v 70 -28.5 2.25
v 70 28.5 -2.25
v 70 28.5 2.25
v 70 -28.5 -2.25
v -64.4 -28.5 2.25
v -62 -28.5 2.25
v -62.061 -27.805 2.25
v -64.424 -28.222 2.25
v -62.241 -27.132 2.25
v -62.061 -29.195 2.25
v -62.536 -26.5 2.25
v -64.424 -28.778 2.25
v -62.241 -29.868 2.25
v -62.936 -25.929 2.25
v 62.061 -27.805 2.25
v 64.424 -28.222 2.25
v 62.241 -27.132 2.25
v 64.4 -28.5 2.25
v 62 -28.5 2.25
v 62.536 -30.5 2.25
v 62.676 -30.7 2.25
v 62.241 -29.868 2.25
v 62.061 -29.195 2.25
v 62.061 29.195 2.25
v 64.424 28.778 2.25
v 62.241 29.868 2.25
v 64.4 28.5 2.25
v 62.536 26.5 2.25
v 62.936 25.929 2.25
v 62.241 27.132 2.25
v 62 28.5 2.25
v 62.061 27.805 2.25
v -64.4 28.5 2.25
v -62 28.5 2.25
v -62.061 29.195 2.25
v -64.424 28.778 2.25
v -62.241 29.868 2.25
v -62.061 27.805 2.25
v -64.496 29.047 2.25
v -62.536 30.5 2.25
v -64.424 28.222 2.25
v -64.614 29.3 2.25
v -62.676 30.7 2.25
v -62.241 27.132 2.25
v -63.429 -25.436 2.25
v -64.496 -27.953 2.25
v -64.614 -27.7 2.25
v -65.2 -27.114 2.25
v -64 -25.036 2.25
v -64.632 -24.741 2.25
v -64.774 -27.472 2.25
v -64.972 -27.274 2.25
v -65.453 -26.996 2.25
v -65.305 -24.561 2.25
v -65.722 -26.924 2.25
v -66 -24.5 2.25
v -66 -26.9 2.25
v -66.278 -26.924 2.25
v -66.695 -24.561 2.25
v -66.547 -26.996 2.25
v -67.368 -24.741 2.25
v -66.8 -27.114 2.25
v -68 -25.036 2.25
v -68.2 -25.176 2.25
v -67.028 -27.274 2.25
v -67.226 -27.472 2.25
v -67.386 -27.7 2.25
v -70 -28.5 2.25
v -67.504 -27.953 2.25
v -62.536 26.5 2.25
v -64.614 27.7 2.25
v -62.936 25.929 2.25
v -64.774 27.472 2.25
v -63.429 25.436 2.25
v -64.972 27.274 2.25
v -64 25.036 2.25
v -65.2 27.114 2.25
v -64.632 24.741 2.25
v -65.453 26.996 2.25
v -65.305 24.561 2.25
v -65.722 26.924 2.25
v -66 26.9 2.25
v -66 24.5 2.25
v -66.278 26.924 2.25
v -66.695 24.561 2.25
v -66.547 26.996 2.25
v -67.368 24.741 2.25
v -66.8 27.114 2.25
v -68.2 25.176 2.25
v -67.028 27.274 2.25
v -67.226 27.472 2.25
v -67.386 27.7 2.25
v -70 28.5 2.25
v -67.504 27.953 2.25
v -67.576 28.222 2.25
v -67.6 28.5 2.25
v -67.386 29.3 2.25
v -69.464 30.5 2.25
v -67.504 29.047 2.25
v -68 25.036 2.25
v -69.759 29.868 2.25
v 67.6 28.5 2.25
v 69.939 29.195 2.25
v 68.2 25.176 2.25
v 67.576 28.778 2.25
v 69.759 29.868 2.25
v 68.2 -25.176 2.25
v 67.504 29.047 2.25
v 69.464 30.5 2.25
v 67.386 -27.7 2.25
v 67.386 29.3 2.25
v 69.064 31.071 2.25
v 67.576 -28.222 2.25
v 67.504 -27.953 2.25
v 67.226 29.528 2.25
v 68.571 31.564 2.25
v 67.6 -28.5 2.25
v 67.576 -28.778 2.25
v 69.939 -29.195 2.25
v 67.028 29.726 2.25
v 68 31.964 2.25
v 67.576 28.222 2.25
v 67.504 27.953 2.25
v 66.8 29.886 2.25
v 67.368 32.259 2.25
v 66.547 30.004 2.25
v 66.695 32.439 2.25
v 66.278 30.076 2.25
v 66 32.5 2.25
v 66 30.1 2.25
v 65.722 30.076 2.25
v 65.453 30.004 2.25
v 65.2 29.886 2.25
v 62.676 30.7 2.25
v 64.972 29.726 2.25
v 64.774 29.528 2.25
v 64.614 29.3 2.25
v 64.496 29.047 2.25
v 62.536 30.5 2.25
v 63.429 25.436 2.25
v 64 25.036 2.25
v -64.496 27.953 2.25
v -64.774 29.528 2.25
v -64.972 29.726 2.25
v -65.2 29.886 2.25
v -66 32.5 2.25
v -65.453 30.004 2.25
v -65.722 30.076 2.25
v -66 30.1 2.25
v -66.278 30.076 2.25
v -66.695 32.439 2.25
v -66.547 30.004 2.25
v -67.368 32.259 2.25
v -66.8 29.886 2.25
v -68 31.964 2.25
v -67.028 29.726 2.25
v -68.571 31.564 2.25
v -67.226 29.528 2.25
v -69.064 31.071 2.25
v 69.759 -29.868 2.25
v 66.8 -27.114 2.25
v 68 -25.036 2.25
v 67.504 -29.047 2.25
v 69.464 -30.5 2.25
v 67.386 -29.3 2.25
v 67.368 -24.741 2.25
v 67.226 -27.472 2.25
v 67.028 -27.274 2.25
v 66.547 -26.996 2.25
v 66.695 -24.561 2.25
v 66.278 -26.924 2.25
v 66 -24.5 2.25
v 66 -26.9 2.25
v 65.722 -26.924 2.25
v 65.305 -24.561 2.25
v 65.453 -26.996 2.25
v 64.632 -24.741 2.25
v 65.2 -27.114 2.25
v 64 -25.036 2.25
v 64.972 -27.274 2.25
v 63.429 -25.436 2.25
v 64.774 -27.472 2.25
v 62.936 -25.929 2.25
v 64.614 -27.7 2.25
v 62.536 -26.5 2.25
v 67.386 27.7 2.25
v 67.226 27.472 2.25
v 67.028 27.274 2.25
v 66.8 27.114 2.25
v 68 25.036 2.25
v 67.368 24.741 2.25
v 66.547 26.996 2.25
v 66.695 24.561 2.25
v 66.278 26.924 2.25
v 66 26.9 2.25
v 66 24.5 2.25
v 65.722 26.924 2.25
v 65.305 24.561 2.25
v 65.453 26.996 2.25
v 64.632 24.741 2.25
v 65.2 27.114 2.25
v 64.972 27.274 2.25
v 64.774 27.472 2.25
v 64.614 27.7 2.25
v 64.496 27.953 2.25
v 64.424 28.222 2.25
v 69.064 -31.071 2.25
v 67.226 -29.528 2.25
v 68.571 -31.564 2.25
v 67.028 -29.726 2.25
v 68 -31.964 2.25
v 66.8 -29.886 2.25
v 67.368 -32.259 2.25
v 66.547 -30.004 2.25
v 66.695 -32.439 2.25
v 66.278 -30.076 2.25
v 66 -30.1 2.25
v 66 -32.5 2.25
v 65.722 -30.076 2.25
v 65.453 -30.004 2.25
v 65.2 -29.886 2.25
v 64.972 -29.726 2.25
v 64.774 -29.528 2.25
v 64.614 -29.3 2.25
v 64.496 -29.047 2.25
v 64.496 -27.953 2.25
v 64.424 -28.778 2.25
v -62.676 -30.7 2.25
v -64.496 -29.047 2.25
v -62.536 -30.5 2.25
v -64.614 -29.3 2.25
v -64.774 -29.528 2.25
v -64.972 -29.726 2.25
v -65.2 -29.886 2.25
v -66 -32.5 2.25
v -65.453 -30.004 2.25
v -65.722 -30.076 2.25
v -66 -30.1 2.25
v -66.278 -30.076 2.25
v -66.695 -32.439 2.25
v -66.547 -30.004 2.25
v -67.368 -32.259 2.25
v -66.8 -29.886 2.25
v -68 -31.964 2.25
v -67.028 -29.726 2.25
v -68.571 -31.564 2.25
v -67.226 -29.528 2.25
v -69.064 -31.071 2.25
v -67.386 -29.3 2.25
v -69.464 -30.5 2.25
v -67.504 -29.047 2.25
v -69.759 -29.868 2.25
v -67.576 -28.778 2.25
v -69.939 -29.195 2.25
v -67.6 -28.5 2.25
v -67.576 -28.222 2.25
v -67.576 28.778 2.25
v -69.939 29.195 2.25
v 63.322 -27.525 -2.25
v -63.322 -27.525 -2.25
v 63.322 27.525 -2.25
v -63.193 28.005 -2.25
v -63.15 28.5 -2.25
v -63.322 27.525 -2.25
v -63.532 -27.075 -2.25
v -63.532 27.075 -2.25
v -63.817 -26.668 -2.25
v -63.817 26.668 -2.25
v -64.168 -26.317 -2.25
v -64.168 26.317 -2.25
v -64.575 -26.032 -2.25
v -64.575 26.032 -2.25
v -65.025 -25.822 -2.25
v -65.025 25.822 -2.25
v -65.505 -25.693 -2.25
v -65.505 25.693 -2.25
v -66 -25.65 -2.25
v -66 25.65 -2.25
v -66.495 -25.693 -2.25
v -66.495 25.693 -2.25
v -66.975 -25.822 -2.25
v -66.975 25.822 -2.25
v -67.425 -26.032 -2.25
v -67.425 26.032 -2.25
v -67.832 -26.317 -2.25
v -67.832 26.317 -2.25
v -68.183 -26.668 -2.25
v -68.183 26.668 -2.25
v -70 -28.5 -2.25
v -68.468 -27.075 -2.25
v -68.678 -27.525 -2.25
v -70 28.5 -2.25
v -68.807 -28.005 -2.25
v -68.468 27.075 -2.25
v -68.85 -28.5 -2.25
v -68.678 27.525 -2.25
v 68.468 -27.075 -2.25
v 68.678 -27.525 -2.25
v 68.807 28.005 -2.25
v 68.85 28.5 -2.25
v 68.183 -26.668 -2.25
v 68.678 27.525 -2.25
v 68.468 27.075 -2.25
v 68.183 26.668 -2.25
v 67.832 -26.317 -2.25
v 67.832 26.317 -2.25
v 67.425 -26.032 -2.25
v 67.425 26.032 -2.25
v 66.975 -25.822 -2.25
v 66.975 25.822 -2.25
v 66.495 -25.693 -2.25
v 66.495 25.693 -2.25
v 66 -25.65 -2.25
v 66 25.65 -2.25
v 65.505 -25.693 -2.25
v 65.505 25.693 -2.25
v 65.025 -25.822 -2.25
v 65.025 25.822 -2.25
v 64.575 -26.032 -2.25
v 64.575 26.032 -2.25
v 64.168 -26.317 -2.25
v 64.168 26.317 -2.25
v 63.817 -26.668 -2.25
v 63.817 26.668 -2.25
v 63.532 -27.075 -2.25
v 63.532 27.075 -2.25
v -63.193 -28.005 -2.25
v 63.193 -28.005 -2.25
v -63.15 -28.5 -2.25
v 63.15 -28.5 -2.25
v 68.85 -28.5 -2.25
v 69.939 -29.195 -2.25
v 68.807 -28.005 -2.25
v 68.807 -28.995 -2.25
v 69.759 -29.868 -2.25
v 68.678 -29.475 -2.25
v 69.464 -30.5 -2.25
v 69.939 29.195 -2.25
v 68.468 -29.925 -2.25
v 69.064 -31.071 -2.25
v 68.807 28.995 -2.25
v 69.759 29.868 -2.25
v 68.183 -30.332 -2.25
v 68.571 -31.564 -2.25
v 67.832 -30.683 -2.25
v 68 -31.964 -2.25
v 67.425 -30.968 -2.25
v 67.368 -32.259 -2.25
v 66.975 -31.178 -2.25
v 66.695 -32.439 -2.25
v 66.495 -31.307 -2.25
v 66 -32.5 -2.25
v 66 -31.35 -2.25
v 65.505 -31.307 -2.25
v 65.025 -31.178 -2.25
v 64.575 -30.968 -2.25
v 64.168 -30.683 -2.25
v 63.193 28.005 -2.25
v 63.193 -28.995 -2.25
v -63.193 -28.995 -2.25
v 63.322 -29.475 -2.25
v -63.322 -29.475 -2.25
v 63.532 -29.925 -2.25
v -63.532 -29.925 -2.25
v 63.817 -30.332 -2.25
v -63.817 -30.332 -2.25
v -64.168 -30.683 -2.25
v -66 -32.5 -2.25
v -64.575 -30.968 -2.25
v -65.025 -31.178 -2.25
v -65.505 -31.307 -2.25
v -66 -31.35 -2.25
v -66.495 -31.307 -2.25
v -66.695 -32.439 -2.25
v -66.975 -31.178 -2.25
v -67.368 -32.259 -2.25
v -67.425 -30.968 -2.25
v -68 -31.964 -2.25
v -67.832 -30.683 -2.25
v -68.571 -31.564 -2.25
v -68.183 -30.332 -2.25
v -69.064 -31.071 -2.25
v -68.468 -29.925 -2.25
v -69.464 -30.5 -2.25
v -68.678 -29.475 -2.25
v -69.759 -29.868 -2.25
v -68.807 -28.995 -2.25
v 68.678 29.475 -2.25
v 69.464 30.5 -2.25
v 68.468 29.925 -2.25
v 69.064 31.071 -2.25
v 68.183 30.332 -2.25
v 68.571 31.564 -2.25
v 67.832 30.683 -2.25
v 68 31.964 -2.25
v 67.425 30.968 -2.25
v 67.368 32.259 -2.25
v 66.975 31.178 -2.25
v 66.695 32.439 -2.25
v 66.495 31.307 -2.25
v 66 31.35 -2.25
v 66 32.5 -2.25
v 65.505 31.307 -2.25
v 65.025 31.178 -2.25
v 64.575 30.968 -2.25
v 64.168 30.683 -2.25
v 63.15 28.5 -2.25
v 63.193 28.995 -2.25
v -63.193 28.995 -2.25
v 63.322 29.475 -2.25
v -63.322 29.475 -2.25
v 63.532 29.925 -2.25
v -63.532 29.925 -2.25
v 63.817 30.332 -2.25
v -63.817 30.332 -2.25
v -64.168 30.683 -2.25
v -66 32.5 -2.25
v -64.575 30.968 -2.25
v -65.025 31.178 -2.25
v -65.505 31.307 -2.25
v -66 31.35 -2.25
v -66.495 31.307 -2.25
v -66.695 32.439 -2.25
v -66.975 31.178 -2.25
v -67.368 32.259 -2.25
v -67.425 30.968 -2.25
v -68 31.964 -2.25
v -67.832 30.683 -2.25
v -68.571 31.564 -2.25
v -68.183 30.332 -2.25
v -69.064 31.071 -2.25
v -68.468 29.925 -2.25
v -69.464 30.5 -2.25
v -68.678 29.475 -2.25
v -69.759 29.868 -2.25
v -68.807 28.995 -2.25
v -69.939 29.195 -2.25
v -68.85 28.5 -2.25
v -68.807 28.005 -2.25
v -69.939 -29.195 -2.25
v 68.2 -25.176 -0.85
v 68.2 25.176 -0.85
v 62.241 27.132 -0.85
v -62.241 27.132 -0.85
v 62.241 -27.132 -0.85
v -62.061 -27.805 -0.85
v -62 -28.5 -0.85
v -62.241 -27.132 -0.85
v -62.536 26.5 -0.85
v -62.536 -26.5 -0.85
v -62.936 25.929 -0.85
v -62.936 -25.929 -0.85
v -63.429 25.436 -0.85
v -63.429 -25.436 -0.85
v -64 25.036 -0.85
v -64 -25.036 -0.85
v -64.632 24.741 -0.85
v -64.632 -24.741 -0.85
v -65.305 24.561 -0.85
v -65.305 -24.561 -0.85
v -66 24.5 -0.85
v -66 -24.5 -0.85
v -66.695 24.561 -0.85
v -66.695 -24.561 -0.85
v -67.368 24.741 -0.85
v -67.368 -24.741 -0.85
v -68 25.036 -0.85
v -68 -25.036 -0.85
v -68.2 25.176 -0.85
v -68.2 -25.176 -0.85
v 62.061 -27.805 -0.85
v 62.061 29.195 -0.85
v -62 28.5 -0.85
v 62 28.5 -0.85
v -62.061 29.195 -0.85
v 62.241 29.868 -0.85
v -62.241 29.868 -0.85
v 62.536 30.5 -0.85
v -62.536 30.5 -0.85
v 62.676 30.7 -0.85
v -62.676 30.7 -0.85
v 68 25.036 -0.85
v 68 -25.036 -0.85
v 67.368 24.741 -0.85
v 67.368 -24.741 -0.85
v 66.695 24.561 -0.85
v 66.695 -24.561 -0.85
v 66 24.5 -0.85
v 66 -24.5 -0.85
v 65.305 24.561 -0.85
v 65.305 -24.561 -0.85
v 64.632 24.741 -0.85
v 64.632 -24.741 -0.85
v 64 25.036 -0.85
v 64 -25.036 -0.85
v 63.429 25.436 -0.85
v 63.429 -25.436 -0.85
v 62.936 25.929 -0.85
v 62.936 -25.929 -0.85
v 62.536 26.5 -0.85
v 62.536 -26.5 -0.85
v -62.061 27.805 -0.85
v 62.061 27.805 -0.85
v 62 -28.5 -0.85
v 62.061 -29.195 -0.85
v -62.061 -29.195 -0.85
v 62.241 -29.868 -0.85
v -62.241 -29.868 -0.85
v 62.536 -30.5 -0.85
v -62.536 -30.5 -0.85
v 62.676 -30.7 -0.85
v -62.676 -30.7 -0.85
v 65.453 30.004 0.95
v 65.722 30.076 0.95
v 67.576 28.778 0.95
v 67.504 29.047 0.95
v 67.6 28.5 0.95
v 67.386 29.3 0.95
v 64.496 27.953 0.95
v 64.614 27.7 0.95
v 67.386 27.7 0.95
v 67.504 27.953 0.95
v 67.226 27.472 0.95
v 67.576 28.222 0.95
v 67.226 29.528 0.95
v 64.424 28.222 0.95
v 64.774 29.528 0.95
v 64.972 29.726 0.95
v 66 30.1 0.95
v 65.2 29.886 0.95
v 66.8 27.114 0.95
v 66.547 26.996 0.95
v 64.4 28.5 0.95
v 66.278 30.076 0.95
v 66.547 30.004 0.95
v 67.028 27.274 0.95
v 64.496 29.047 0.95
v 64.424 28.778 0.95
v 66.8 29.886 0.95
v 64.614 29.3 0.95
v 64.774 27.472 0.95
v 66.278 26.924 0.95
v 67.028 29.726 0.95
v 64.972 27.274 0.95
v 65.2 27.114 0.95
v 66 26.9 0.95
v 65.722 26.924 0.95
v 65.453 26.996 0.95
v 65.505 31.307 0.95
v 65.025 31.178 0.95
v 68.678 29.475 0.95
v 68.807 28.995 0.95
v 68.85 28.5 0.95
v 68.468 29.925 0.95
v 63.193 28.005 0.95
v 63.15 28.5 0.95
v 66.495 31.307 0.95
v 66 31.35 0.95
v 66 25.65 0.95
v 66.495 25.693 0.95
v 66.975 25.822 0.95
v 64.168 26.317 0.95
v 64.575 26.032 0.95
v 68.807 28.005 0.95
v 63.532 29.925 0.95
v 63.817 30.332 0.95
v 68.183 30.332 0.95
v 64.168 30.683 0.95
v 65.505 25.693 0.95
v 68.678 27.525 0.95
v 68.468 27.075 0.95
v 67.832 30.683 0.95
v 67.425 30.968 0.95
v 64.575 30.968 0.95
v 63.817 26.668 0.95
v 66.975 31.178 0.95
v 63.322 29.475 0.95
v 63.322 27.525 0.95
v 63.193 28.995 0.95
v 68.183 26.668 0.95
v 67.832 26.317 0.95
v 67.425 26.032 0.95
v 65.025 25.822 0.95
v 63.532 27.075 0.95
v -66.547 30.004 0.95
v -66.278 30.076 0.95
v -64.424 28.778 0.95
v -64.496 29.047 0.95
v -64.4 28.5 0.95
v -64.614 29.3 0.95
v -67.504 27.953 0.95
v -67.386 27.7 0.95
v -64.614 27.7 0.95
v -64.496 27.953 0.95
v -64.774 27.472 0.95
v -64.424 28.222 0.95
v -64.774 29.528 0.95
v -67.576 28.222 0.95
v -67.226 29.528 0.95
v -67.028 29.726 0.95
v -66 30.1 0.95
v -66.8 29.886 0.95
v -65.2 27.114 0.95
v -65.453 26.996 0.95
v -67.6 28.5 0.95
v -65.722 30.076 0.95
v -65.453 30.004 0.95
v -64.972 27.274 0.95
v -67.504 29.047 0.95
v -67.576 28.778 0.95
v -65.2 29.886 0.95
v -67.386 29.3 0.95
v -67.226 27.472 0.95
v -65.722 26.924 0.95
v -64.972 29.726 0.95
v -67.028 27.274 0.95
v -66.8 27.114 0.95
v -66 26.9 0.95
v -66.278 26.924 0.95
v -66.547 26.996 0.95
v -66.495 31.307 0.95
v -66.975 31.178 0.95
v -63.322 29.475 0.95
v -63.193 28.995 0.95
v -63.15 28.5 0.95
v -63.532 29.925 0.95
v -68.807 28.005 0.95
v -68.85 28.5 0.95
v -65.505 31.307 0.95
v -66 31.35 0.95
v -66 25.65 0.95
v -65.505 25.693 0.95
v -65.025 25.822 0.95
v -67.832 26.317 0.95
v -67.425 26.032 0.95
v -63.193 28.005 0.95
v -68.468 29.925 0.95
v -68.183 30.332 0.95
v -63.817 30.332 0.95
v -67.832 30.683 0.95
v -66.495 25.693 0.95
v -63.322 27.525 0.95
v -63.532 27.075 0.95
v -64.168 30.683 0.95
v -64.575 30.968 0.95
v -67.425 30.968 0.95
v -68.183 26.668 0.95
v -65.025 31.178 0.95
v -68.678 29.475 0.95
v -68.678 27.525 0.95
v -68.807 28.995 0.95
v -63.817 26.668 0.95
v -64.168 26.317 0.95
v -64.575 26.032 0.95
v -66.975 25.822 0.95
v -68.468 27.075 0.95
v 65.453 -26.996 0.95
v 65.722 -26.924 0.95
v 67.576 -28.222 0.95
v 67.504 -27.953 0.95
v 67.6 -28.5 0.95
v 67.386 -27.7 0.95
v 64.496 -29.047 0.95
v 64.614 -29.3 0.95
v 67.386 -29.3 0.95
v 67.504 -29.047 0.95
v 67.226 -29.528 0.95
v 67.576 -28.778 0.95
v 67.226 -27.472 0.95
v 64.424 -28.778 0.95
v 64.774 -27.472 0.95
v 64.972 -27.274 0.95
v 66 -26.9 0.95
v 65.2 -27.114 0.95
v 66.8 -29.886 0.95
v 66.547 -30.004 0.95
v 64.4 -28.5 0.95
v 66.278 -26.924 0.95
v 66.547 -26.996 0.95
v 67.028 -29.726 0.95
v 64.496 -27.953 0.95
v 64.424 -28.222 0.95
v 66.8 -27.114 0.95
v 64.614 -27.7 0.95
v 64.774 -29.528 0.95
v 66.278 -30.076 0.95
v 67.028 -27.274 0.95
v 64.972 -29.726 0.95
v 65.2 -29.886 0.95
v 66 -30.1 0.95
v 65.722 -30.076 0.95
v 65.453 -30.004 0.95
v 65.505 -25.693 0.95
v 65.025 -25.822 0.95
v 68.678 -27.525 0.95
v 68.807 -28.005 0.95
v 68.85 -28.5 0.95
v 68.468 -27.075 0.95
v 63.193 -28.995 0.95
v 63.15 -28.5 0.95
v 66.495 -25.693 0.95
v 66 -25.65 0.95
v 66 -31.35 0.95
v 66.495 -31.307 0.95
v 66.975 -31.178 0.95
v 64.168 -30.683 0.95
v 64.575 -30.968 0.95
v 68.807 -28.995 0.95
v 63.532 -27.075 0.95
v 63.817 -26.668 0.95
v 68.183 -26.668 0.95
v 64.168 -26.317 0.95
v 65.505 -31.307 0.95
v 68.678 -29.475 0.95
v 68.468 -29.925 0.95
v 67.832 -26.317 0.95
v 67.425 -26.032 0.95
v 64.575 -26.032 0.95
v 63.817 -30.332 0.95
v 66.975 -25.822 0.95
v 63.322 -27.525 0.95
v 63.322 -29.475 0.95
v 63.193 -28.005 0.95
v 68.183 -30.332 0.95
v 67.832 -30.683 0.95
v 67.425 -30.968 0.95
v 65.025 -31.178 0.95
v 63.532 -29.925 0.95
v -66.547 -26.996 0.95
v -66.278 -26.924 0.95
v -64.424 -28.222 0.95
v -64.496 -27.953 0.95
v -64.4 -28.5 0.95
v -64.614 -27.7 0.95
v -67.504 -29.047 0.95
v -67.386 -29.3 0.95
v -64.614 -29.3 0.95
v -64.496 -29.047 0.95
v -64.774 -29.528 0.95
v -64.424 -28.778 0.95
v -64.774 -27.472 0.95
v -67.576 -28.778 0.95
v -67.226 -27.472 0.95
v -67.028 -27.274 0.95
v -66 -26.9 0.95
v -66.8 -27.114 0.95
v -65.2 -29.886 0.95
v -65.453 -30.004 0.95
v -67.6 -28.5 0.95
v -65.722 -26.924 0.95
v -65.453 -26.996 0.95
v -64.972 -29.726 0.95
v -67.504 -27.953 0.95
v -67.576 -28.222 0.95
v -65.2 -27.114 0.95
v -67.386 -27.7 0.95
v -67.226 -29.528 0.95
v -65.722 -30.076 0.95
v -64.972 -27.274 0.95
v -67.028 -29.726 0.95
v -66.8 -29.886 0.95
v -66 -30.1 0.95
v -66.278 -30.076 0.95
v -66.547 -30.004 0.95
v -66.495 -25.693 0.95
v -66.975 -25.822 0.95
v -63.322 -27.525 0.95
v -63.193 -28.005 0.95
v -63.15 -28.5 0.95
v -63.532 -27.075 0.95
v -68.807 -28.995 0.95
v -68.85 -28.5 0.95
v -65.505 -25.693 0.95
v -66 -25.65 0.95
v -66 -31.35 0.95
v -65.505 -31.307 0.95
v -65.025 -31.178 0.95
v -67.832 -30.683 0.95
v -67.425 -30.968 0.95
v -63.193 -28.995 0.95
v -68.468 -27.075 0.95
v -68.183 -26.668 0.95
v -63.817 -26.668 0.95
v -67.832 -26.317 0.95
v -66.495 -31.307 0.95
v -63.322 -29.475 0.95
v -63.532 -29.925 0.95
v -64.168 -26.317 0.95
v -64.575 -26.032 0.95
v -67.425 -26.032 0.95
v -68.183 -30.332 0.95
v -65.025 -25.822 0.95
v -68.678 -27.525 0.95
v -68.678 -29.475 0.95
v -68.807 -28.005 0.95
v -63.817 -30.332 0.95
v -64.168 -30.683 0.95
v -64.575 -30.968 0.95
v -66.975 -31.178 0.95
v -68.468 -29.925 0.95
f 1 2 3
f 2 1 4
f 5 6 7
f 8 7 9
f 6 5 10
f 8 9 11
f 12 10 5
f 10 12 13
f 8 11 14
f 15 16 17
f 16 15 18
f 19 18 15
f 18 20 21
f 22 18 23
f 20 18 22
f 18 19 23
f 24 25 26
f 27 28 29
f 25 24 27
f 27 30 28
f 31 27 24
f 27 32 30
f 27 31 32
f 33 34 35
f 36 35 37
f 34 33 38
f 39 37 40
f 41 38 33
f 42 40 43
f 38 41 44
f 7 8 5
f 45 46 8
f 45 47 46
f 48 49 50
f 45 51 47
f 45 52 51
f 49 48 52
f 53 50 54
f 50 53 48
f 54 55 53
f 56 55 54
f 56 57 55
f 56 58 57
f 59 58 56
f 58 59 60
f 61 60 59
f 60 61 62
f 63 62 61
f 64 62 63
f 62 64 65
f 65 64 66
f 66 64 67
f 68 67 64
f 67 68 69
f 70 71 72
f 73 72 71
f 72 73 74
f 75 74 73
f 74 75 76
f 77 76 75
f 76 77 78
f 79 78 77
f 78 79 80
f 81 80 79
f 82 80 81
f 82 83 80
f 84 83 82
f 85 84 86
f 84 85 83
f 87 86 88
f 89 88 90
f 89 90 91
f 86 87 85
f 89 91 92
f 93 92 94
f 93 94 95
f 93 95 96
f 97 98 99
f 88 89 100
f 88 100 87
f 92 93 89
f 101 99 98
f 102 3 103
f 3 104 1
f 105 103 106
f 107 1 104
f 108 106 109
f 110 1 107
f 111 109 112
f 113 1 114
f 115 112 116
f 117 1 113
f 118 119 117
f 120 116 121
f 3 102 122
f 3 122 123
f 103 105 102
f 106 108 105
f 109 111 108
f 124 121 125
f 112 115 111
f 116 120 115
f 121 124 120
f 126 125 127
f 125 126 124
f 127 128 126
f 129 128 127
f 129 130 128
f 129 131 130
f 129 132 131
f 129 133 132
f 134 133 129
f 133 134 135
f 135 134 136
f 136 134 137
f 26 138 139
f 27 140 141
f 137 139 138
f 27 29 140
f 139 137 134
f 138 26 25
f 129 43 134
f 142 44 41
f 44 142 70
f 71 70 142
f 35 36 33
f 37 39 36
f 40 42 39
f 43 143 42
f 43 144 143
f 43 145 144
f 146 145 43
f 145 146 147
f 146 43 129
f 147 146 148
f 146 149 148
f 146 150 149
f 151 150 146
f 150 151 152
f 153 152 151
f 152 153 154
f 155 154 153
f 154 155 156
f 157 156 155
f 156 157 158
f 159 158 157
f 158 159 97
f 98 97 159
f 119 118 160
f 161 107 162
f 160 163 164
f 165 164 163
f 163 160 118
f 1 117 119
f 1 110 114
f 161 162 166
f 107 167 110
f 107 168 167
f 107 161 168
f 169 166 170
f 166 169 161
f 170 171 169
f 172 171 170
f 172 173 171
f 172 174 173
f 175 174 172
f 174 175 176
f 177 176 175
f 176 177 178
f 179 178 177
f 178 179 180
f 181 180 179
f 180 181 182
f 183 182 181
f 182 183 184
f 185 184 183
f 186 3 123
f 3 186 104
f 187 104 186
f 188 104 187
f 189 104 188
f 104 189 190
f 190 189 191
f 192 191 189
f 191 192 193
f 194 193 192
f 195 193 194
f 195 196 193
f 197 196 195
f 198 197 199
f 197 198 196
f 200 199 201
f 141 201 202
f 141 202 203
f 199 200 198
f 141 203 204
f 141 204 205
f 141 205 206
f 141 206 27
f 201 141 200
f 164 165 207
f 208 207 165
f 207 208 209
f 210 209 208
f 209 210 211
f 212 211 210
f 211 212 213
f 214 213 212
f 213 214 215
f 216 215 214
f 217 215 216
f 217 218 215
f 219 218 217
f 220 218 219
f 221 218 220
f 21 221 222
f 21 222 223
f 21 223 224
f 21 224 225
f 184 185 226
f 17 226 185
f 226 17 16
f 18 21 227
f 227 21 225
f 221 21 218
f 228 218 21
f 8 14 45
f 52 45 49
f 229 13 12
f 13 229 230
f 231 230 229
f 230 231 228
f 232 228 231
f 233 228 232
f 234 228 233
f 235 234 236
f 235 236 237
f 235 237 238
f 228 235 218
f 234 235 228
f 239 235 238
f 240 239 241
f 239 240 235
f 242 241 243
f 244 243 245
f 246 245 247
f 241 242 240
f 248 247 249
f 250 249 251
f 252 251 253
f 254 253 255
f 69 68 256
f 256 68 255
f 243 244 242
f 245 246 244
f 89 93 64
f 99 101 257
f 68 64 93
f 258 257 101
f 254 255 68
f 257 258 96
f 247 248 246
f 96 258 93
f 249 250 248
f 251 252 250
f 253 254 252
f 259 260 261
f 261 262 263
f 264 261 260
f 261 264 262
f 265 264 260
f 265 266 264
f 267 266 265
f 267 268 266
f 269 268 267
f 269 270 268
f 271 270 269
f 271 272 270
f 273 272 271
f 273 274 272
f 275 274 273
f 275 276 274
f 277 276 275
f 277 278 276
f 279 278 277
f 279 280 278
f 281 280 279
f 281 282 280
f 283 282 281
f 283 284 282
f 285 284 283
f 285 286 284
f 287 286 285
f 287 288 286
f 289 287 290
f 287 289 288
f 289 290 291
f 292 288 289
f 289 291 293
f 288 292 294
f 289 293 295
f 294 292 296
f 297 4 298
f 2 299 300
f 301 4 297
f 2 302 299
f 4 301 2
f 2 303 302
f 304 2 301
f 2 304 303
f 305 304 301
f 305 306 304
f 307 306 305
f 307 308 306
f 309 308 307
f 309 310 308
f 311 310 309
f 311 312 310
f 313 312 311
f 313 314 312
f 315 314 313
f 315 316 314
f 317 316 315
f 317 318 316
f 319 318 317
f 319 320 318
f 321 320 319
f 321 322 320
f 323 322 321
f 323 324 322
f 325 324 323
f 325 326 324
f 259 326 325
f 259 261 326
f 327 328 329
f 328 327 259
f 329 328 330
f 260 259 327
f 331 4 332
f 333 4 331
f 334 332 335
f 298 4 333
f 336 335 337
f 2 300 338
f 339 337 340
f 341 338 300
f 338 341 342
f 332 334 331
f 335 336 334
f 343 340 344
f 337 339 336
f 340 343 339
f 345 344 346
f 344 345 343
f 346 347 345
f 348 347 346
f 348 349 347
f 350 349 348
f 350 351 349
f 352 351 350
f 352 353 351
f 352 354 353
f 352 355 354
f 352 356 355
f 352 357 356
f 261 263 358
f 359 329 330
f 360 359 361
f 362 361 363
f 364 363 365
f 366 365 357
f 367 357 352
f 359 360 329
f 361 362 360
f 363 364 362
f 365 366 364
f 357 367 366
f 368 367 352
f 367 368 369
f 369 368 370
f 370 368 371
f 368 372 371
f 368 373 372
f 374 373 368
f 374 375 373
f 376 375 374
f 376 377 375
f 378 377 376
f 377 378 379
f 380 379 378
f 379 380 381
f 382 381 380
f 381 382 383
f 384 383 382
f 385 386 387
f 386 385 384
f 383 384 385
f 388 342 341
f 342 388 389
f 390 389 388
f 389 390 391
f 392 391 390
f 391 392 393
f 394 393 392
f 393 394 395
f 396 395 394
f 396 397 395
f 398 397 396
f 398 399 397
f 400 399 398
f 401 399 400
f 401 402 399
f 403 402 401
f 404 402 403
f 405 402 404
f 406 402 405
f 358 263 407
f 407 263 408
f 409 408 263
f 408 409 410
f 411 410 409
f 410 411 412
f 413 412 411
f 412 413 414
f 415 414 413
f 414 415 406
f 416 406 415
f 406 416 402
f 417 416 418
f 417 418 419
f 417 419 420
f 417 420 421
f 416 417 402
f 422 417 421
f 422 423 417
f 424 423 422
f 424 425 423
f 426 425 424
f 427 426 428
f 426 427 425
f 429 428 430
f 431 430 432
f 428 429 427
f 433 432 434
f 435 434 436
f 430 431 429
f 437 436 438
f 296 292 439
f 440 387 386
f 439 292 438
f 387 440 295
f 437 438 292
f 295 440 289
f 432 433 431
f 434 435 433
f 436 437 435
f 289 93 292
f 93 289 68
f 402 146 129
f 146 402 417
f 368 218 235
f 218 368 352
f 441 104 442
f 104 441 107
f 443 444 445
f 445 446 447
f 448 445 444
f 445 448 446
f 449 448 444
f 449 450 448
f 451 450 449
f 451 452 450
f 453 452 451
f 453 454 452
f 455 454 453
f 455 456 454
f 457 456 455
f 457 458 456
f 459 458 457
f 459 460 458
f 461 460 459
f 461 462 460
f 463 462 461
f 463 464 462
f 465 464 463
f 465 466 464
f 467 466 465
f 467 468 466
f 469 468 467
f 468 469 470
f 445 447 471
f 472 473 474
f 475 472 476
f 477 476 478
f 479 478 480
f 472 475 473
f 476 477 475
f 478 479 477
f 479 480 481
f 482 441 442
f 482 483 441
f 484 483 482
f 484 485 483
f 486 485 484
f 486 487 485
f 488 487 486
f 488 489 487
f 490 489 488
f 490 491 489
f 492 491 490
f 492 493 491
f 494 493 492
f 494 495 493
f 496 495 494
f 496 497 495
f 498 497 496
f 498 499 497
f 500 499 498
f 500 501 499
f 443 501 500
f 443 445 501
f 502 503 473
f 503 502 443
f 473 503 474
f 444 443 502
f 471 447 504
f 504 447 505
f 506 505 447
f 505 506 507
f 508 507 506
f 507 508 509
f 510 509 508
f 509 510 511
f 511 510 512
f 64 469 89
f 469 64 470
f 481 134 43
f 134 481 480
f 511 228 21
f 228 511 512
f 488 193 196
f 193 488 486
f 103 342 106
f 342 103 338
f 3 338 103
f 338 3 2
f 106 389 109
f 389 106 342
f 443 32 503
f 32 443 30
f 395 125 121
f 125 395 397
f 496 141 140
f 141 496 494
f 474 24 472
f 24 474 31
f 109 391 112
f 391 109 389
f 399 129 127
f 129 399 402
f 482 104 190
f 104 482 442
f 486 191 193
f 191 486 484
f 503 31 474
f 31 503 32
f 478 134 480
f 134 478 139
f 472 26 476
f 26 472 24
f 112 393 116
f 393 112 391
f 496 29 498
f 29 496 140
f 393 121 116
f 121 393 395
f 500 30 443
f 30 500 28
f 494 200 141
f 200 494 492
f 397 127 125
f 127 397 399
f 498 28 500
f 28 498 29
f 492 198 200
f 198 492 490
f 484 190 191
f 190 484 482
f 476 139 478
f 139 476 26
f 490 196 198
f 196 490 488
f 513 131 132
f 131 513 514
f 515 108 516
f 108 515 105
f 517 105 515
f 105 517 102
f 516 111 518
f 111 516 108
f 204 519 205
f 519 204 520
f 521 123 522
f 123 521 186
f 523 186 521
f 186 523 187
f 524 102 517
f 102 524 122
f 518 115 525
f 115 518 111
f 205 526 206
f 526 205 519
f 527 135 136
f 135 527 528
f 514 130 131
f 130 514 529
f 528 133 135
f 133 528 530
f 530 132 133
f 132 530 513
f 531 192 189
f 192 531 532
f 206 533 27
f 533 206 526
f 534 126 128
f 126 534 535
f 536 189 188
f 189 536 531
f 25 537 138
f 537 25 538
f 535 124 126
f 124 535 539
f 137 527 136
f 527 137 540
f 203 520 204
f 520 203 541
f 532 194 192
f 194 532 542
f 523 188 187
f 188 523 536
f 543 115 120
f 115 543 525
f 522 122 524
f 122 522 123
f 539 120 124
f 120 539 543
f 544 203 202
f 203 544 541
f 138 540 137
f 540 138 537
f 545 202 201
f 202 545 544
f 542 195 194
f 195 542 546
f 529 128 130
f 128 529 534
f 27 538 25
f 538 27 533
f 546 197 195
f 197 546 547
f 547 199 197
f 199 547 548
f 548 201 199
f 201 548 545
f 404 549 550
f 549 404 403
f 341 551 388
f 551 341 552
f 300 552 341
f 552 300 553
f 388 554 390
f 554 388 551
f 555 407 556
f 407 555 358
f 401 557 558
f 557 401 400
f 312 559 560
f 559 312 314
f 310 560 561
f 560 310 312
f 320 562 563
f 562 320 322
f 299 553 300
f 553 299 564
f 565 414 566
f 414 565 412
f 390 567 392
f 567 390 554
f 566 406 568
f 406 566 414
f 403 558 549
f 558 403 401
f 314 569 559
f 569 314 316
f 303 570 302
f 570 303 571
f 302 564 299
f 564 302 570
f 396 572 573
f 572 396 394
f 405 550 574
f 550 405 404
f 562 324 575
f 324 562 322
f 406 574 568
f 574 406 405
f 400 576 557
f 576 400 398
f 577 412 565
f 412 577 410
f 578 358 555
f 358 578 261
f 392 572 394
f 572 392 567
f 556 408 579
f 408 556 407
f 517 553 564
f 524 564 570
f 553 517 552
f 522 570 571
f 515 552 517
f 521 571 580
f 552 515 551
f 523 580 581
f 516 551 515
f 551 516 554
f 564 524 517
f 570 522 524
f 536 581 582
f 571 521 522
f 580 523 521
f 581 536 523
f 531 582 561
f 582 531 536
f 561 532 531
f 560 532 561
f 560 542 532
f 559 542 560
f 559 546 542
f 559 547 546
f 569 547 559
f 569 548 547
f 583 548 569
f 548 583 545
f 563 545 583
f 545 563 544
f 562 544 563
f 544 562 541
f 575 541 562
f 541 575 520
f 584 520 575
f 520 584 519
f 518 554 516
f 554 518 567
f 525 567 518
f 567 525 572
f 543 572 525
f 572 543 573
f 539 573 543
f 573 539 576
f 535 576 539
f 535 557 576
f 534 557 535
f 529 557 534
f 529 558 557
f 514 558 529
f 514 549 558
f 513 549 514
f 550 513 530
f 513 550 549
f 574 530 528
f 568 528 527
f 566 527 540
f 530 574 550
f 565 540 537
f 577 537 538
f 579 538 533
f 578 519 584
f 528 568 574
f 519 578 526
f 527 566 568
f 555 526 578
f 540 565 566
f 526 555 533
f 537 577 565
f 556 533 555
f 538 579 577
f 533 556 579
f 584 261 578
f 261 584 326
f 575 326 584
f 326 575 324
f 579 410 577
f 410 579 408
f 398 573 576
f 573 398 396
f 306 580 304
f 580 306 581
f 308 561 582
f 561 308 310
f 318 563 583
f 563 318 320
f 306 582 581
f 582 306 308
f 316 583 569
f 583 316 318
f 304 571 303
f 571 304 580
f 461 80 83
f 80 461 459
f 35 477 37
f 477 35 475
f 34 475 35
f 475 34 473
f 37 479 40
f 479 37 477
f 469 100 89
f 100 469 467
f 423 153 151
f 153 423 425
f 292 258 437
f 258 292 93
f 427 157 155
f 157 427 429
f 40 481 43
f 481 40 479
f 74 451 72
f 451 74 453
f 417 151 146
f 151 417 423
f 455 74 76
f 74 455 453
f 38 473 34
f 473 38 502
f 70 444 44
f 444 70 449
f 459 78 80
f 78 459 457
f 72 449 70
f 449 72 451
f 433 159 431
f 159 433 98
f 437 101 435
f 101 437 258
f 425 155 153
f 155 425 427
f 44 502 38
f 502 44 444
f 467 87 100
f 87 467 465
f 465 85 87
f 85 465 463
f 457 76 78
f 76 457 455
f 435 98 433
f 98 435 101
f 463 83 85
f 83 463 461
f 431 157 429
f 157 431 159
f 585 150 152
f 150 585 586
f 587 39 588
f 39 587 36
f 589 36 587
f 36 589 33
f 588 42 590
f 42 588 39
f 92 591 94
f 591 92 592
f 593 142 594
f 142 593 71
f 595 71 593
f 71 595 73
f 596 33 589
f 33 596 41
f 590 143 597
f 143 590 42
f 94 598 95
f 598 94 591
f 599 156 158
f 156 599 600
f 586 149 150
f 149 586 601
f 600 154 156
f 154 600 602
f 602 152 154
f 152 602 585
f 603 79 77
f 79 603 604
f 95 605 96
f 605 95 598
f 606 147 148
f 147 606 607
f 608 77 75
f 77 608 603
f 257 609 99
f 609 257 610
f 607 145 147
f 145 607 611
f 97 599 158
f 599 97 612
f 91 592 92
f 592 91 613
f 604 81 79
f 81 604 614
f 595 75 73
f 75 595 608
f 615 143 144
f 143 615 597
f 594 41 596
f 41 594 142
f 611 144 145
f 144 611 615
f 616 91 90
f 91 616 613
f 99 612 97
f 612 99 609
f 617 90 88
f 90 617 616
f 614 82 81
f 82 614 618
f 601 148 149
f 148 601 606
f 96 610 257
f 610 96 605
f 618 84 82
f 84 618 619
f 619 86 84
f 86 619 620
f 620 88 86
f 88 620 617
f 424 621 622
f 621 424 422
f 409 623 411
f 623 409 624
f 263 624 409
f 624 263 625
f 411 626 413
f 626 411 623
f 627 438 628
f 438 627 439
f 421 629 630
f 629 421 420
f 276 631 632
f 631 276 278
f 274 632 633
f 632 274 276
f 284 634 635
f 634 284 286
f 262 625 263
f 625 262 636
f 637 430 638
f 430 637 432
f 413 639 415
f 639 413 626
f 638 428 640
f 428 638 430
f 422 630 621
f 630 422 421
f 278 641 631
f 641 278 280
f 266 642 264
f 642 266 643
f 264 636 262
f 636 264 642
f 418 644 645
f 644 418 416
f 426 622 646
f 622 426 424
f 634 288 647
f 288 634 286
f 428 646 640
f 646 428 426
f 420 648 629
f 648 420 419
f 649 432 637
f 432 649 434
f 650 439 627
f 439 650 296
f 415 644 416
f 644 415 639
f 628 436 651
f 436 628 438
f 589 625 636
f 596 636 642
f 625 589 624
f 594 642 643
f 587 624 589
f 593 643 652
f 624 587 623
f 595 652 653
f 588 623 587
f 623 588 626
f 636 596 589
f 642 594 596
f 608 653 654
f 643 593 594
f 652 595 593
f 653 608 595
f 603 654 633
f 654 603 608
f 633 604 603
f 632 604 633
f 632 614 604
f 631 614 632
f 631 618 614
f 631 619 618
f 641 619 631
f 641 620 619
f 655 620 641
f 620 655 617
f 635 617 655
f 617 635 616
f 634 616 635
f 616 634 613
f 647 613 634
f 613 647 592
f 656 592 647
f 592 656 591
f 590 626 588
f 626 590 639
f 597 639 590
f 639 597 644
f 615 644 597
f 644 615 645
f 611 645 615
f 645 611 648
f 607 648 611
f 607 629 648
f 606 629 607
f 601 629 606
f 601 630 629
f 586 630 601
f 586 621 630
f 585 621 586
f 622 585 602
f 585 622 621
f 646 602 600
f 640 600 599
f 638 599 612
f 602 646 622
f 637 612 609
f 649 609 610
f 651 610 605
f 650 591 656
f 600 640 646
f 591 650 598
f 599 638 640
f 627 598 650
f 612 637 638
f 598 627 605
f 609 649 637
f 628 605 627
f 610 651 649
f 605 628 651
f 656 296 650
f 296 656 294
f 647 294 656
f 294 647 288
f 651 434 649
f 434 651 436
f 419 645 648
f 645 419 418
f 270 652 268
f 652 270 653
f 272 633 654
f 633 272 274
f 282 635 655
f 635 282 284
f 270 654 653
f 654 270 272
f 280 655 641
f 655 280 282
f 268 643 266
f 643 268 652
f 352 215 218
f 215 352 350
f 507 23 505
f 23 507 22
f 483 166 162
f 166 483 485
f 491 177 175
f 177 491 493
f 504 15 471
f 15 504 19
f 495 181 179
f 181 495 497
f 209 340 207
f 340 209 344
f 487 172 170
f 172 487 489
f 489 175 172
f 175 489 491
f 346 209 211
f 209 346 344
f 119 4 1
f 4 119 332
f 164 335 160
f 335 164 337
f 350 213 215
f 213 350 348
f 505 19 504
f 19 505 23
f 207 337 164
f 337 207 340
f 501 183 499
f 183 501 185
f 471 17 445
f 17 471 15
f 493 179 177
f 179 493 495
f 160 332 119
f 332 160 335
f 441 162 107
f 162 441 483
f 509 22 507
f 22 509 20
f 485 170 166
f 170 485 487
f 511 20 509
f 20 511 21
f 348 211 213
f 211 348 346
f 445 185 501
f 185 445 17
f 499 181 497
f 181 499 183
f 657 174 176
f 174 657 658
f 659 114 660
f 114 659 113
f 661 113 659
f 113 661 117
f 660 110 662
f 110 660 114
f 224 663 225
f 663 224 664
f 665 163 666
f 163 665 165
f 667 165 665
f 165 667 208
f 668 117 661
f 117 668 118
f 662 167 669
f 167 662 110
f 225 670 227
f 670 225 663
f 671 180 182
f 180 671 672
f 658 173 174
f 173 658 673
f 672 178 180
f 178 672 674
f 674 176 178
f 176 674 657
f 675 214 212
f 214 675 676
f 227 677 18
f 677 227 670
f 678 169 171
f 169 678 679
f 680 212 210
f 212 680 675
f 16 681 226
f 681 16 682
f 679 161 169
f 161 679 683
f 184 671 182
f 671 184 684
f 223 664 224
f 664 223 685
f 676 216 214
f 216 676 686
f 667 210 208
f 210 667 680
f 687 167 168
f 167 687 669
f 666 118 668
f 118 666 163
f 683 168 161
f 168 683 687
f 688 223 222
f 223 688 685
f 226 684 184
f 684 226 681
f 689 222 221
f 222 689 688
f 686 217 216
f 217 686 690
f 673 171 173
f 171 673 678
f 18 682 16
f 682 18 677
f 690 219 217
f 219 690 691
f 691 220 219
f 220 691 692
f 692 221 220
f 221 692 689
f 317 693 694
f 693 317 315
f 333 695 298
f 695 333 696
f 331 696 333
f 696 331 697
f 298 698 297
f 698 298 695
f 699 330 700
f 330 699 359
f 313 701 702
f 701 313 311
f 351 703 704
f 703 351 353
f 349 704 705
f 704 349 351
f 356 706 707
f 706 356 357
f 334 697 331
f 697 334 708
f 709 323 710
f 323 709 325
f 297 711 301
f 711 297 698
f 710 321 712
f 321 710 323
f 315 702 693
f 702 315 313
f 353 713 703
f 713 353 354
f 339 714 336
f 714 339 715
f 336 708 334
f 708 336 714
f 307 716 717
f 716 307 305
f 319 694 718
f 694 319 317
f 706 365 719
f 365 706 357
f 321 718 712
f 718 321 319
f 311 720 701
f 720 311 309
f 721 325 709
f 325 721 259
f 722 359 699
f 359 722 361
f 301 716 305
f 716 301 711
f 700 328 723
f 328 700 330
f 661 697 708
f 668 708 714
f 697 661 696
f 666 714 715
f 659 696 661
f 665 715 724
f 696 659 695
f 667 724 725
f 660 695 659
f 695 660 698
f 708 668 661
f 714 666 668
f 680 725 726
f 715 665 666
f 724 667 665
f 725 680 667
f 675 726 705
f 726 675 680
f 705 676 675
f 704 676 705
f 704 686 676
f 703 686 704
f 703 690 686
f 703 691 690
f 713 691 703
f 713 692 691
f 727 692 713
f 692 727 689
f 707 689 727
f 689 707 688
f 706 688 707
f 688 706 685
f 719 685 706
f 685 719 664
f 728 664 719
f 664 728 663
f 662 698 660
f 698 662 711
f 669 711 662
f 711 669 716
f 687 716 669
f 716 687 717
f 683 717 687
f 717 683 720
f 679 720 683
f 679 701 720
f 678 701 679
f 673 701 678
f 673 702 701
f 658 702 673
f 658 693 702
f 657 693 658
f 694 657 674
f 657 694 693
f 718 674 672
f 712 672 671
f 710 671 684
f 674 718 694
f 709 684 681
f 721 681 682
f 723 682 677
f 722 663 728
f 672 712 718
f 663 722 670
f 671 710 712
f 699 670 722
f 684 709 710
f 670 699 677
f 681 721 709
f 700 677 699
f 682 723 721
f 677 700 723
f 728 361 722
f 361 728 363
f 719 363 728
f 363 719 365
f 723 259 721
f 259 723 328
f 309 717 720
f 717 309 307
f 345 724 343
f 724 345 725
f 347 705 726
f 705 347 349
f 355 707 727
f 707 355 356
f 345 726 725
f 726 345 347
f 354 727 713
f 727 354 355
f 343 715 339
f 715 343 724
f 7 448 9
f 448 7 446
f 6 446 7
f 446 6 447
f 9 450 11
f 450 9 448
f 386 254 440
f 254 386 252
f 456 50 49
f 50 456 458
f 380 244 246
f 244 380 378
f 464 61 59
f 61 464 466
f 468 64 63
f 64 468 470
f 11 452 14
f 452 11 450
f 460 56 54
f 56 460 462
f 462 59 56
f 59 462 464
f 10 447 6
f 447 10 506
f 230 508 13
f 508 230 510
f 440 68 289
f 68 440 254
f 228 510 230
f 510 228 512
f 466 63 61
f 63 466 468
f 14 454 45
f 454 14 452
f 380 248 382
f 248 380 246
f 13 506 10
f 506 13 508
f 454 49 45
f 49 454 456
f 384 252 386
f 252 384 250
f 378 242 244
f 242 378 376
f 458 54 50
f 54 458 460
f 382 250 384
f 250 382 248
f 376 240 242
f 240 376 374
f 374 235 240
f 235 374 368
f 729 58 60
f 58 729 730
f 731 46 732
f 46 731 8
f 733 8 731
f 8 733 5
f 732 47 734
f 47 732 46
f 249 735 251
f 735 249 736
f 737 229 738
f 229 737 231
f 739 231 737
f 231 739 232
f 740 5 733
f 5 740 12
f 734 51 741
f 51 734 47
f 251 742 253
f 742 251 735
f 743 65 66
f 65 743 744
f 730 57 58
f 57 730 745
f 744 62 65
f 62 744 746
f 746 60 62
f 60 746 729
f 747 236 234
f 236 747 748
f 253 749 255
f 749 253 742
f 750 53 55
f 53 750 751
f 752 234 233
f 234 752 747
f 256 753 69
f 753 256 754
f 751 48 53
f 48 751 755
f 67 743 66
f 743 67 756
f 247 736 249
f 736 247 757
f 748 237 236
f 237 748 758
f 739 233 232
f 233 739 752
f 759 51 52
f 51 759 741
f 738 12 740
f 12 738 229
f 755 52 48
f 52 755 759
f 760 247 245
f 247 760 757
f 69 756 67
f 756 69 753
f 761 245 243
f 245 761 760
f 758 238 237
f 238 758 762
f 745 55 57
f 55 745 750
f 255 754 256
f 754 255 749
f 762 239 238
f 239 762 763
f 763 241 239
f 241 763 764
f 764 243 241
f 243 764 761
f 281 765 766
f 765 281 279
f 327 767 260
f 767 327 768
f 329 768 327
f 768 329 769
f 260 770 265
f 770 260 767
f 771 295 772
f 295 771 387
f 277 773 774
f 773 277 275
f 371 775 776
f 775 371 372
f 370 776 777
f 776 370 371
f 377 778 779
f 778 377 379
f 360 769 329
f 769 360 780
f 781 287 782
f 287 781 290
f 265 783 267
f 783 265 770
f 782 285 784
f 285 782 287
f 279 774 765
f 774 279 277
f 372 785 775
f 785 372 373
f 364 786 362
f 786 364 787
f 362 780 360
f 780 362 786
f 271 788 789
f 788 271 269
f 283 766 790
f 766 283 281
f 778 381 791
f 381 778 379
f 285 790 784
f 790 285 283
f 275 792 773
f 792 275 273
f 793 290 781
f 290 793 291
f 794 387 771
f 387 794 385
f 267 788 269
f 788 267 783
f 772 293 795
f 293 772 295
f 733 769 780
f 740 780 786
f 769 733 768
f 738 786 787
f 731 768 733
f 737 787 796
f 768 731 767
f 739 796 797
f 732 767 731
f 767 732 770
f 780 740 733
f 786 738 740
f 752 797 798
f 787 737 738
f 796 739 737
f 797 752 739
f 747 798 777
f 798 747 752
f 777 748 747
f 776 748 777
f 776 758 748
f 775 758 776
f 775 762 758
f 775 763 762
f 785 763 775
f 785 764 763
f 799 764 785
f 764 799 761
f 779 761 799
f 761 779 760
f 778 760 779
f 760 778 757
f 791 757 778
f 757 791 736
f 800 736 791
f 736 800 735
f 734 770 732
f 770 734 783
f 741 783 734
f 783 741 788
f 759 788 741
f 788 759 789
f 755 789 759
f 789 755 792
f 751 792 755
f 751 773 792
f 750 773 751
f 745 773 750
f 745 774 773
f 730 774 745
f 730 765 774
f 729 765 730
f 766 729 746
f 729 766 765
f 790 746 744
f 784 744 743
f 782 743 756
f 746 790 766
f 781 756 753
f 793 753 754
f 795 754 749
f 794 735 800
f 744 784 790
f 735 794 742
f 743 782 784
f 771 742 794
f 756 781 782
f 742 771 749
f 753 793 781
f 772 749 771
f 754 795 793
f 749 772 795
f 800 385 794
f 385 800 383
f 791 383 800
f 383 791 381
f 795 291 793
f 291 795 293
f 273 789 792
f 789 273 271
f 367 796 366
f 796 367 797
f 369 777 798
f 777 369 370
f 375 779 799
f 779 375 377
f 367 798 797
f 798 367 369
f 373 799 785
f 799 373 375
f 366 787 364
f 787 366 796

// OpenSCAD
// Definition size of housing
// **************************

       // Those settings have to be identical to the box !!!
width_x      = 140;          // Width of the cover (outer dimension) 
debth_y      = 65;           // Debth of the cover (outer dimension)
wall         = 1.8;          // Side wall thickness of the cover
cornerradius = 4.0;          // Radius of the corners
                             //   This value also defines the posts for stability and
                             //   for the screw holes!

       // Those settings are more or less independent from the cover
height_z     = 4.5;          // Heigth of the cover. Total height is this value plus
                             //   the height of the box
plate        = 1.4;          // Thickness of top plate. Consider this value for the
                             //   elements which need to be mounted as well as for 
                             //   mechanical stability

       //Definition size of screws (Example value for M3 inner hex screw)
screwholediameter  = 3.2;    // Size of screw hole
screwheaddiameter  = 5.7;    // Size for screw head (diameter)
screwheadheigth    = 3.2;    // Heigth of the screw head
                             //   Screw head sits on top of cover if this value is set to zero
                             //   Consider material under screw head for mechanical strength 
                             //   when plunging screw 

//Definition of circle angular resolution
resol        = 36;           // Identical to housing !!!



difference () {

   // Construction Main Cover
   union () {
      difference () {
         // Construction of cover plate
         union () {
            cube ( [width_x, debth_y - (2* cornerradius), height_z], center = true );
            cube ( [width_x - (2* cornerradius), debth_y, height_z], center = true );
         };
         // Remove inner material
         translate ( [0,0, plate / 2] ){
            cube ( [width_x - (2* wall), debth_y- (2* wall), height_z - plate], center = true );
         };
         // Remove Screw hole in the 1st quadrant (required if screw head is thinner than plate!)
         translate ( [(width_x / 2) - cornerradius, (debth_y / 2) - cornerradius, 0 ] ) {
            cylinder ( h = height_z, r = screwheaddiameter / 2, center = true, $fn = resol );
         };
         // Remove Screw hole in the 2nd quadrant (required if screw head is thinner than plate!)
         translate ( [-(width_x / 2) + cornerradius, (debth_y / 2) - cornerradius, 0 ] ) {
            cylinder ( h = height_z, r = screwheaddiameter / 2, center = true, $fn = resol );
         };
         // Remove Screw hole in the 4th quadrant (required if screw head is thinner than plate!)
         translate ( [(width_x / 2) - cornerradius, -(debth_y / 2) + cornerradius, 0 ] ) {
            cylinder ( h = height_z, r = screwheaddiameter / 2, center = true, $fn = resol );
         };
         // Remove Screw hole in the 3rd quadrant (required if screw head is thinner than plate!)
         translate ( [-(width_x / 2) + cornerradius, -(debth_y / 2) + cornerradius, 0 ] ) {
            cylinder ( h = height_z, r = screwheaddiameter / 2, center = true, $fn = resol );
         };
      };

      // Construction of corner posts, screw holes and screw head holes
      //   in 1st quadrant
      translate ( [(width_x / 2) - cornerradius, (debth_y / 2) - cornerradius, 0 ] ) {
         difference () {
            cylinder (h=height_z, r=cornerradius, center = true, $fn = resol);
            cylinder (h = height_z, r = screwholediameter / 2, center = true, $fn = resol);
            translate ( [ 0, 0, - ( height_z / 2 ) + ( screwheadheigth / 2 ) ] ) {
               cylinder ( h = screwheadheigth, r = screwheaddiameter / 2, center = true, $fn = resol );
            };
         };
      };
      //   in 2nd quadrant
      translate ( [-(width_x / 2) + cornerradius, (debth_y / 2) - cornerradius, 0] ) {
         difference () {
            cylinder (h=height_z, r=cornerradius, center = true, $fn = resol);
            cylinder (h = height_z, r = screwholediameter / 2, center = true, $fn = resol);
            translate ( [ 0, 0, - ( height_z / 2 ) + ( screwheadheigth / 2 ) ] ) {
               cylinder ( h = screwheadheigth, r = screwheaddiameter / 2, center = true, $fn = resol );
            };
         };
      };
      //   in 4th quadrant
      translate ( [(width_x / 2) - cornerradius, -(debth_y / 2) + cornerradius, 0] ) {
         difference () {
            cylinder (h=height_z, r=cornerradius, center = true, $fn = resol);
            cylinder (h = height_z, r = screwholediameter / 2, center = true, $fn = resol);
            translate ( [ 0, 0, - ( height_z / 2 ) + ( screwheadheigth / 2 ) ] ) {
               cylinder ( h = screwheadheigth, r = screwheaddiameter / 2, center = true, $fn = resol );
            };
         };
      };
      //   in 3rd quadrant
      translate ( [-(width_x / 2) + cornerradius, -(debth_y / 2) + cornerradius, 0] ) {
         difference () {
            cylinder (h=height_z, r=cornerradius, center = true, $fn = resol);
            cylinder (h = height_z, r = screwholediameter / 2, center = true, $fn = resol);
            translate ( [ 0, 0, - ( height_z / 2 ) + ( screwheadheigth / 2 ) ] ) {
               cylinder ( h = screwheadheigth, r = screwheaddiameter / 2, center = true, $fn = resol );
            };
         };
      };
   };

   // Space for Breakouts, holes, ...


};
